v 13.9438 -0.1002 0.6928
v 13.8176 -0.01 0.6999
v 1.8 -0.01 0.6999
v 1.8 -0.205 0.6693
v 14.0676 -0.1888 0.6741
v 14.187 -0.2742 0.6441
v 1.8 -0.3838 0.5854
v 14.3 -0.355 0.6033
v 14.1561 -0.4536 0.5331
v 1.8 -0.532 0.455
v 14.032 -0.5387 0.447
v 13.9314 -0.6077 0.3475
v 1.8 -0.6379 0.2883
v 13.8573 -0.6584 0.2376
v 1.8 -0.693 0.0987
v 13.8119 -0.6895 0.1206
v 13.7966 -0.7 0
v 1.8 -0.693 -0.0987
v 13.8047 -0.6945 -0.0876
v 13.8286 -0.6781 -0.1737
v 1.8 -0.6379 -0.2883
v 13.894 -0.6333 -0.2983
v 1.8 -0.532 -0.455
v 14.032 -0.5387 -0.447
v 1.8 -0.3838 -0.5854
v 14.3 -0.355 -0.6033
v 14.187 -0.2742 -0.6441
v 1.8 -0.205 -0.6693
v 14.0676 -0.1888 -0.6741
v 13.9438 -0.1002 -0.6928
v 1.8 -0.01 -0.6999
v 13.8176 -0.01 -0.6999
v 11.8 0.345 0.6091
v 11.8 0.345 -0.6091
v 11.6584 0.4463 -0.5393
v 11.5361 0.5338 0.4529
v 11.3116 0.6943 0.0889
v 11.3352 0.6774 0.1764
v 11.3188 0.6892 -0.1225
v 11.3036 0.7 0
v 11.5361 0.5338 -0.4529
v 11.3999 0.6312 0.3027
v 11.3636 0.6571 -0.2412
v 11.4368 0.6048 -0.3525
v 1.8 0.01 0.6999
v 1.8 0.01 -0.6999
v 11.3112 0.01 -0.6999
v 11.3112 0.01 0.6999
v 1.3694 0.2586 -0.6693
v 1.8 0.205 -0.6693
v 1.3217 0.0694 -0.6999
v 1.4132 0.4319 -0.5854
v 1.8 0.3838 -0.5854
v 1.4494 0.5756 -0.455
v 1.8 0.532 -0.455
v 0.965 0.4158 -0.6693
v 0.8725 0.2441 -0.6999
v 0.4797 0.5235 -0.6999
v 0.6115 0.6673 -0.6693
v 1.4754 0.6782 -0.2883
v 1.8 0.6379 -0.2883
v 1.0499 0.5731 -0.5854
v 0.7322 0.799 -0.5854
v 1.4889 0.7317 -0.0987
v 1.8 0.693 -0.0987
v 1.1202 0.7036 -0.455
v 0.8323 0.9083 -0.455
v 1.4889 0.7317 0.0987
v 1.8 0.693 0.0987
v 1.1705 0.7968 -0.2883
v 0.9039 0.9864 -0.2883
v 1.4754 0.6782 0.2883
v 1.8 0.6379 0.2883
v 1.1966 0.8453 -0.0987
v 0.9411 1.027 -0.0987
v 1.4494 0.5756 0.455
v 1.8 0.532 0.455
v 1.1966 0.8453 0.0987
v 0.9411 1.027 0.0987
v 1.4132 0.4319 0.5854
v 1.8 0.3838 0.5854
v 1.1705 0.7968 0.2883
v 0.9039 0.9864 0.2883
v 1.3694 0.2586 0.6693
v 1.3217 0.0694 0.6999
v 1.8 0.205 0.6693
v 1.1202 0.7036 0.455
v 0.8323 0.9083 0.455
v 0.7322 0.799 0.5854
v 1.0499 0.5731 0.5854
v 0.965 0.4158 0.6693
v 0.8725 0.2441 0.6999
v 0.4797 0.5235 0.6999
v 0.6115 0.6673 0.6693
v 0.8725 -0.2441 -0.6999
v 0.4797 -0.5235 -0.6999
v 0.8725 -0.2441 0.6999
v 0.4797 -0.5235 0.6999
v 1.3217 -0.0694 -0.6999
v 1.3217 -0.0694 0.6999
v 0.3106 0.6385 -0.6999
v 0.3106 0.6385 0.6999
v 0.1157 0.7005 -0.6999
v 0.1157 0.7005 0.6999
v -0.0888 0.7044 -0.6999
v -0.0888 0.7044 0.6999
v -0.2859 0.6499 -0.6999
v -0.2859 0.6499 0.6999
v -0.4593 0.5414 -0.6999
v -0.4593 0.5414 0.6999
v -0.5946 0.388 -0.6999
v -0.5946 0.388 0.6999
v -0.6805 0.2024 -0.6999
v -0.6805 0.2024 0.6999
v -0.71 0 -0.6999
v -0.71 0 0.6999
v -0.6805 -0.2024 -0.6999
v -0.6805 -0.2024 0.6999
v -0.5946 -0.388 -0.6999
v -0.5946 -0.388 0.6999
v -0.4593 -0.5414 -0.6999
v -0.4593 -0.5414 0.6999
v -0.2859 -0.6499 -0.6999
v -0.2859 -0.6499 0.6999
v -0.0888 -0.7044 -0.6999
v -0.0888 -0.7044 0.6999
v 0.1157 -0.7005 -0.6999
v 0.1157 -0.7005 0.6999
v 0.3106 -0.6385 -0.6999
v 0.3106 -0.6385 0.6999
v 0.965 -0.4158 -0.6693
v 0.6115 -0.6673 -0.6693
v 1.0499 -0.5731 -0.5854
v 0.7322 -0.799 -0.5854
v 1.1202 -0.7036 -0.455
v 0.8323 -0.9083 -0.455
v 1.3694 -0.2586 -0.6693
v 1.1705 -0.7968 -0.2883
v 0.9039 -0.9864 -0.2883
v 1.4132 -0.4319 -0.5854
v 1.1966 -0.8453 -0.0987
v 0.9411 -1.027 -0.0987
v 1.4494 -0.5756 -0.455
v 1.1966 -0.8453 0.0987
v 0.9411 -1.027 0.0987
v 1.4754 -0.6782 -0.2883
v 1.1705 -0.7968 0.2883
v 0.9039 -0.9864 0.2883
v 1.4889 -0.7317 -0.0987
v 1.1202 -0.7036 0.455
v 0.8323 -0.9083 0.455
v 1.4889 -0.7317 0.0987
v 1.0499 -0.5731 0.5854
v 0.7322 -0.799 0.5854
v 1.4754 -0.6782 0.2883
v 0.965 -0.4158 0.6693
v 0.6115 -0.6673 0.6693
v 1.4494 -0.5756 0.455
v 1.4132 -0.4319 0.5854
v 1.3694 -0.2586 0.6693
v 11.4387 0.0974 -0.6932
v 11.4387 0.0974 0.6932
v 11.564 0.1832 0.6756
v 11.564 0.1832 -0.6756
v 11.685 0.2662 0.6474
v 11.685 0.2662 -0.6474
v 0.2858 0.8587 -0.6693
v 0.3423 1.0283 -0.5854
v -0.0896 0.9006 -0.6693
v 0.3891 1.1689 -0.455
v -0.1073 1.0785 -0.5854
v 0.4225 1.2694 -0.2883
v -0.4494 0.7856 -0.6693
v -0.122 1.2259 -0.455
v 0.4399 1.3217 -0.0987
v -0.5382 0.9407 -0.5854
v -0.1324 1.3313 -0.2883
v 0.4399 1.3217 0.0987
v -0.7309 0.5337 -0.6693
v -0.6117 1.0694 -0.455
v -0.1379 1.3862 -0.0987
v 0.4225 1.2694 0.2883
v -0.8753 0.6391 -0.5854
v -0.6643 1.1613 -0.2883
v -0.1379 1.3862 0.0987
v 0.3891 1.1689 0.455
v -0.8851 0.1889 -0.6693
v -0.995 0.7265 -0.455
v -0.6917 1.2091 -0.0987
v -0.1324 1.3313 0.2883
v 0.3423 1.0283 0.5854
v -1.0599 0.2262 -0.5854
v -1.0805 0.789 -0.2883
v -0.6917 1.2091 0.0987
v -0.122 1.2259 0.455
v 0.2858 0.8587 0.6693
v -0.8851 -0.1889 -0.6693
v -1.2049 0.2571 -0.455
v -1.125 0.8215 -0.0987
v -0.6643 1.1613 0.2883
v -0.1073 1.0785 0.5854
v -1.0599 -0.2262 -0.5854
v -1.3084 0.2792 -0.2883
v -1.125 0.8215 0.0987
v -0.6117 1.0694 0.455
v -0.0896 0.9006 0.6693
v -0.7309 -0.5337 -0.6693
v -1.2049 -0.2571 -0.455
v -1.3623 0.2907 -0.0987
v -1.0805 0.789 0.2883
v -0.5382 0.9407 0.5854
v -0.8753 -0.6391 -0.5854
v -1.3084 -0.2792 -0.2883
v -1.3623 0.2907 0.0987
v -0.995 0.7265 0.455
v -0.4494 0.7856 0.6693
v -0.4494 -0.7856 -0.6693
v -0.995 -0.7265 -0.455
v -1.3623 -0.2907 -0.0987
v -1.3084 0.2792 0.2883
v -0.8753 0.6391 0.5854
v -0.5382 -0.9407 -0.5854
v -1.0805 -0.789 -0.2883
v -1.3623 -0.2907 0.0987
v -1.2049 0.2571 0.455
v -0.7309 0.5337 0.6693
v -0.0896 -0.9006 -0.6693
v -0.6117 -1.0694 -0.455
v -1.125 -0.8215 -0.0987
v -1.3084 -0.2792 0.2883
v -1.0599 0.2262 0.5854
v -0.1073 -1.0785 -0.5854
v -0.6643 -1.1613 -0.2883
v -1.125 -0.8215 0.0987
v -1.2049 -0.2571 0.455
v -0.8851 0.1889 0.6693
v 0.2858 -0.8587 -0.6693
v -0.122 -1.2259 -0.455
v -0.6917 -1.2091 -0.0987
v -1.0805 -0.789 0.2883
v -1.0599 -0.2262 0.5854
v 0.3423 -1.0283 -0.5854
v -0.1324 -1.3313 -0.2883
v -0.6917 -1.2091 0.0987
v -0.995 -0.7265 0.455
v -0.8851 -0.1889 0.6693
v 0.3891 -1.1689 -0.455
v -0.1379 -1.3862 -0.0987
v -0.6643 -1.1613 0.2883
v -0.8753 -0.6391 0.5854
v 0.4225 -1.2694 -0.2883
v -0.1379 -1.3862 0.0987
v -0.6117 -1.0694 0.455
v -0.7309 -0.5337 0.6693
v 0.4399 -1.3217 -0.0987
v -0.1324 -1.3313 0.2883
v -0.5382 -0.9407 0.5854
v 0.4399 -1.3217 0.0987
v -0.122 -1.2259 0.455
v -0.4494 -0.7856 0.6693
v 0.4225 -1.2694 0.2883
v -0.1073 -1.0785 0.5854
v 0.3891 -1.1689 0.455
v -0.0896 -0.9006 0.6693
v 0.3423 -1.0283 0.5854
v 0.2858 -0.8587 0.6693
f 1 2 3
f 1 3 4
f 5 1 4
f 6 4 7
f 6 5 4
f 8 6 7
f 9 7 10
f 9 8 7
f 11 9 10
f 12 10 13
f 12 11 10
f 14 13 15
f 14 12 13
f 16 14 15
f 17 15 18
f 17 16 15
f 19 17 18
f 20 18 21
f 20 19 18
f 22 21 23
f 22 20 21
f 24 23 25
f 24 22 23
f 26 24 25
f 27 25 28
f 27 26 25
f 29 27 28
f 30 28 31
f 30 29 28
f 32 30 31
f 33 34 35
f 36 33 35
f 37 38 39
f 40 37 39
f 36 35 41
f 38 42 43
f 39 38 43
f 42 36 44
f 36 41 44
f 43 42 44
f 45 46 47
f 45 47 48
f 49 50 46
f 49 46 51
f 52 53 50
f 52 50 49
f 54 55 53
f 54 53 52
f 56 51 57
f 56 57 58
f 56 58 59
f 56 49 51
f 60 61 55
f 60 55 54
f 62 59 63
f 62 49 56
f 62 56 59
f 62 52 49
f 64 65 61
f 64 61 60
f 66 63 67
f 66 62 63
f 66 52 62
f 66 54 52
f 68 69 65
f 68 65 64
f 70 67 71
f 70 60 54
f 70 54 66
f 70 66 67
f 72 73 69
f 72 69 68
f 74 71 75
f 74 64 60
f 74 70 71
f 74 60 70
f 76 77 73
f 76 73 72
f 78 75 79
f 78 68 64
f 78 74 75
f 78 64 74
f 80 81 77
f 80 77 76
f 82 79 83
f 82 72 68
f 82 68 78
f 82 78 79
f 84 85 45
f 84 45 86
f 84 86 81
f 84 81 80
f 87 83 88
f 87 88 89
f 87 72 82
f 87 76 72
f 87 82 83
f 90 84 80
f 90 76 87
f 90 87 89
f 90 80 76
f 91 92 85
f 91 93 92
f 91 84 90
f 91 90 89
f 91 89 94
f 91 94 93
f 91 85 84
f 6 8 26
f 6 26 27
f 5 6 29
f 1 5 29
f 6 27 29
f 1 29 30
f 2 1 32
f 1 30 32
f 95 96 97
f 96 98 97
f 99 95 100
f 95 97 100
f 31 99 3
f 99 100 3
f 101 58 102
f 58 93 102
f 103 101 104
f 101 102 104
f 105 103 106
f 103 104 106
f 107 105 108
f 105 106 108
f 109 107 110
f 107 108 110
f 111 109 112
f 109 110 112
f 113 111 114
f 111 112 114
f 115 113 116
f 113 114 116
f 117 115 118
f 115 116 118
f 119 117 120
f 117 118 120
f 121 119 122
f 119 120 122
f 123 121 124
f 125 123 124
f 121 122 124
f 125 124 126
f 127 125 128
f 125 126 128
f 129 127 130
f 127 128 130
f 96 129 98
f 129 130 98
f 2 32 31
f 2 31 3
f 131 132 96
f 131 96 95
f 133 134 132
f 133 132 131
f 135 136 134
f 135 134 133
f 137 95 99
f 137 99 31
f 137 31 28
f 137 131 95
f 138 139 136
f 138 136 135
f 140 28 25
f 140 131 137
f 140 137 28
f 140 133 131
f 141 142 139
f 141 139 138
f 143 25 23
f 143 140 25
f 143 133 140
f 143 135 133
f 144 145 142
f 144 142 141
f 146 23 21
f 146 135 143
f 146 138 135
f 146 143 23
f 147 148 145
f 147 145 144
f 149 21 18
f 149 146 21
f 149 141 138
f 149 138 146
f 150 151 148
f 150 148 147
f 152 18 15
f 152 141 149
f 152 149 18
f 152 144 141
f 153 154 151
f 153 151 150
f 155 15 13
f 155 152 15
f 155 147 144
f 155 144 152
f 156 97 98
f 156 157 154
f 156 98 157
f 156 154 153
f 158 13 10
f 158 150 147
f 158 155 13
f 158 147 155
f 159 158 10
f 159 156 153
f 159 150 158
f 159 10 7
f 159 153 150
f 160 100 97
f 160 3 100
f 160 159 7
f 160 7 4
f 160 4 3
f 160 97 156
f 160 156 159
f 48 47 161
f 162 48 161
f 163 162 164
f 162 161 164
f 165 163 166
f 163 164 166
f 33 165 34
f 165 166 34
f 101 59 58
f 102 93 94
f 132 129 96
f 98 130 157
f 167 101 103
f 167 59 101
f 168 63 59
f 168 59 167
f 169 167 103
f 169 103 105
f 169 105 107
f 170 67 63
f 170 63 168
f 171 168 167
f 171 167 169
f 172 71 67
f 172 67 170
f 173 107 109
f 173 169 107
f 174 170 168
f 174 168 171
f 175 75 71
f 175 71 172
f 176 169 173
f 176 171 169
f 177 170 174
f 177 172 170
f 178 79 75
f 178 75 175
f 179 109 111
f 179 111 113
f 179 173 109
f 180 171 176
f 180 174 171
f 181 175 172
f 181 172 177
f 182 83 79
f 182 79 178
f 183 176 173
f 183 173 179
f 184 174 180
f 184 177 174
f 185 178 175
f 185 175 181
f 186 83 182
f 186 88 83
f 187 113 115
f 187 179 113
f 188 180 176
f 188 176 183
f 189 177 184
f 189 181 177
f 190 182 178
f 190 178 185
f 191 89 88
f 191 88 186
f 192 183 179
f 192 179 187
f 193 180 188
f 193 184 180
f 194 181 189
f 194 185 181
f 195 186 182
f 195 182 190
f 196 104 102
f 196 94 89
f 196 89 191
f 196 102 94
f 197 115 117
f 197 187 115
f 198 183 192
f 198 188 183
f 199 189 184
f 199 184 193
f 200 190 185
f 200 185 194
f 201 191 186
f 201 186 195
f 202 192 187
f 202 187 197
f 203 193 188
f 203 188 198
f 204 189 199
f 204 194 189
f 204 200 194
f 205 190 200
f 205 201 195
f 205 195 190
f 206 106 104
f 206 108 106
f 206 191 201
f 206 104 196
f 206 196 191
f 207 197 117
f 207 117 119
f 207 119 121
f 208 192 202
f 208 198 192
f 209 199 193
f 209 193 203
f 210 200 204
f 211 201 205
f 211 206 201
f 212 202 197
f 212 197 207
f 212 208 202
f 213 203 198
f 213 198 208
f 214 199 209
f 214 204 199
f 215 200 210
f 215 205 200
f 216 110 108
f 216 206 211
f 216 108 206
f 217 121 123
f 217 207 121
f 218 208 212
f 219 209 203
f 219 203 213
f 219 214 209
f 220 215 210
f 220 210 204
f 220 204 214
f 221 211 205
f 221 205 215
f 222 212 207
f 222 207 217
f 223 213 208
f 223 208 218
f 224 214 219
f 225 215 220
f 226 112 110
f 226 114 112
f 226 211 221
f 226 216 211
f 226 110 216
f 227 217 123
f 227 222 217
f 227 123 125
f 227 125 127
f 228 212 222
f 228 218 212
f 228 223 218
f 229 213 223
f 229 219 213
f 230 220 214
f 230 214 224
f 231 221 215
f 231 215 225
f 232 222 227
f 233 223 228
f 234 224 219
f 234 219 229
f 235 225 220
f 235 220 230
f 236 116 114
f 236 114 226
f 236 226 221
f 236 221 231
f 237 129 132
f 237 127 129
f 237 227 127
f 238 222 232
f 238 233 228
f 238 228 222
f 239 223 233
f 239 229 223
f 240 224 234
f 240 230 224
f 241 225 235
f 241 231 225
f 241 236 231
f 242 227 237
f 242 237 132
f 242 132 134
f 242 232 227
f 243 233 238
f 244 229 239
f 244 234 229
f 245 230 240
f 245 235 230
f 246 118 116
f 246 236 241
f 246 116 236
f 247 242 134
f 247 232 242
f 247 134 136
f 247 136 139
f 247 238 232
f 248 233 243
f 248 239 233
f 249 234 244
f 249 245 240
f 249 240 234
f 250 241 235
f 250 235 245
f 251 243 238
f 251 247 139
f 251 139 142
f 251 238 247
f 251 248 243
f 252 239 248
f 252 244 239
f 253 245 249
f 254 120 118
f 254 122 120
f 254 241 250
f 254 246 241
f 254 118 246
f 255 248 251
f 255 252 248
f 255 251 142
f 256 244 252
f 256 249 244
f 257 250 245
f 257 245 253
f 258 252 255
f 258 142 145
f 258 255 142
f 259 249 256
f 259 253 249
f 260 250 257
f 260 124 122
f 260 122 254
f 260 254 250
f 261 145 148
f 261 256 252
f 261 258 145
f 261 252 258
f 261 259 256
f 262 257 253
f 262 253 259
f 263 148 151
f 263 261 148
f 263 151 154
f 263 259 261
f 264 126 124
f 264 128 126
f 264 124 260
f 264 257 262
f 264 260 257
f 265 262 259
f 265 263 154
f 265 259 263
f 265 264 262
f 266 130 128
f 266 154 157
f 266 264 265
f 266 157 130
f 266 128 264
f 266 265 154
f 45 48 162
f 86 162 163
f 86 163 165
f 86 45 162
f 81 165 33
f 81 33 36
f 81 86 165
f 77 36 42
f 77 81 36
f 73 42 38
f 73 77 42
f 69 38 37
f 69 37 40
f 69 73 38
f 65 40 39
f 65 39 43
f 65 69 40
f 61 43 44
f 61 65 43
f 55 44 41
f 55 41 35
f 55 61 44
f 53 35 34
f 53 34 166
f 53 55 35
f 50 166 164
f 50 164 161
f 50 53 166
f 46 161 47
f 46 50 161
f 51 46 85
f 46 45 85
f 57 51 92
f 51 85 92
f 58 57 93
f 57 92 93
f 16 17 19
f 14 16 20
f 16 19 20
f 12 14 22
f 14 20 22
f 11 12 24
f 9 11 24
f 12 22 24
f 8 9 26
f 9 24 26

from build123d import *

# Parameters (mm, degrees)
CUT_EXTRUDE_1_DEPTH      = 15.385405814
CUT_EXTRUDE_1_DEPTH_BACK = 15.385405814


with BuildPart() as part:
    # 扫描2: sweep along a path in Sketch 200
    with BuildLine(Plane.XY) as sweep_2_path:
        Line((11.8, 0.7), (1.8, 0.7))
        ThreePointArc((1.8, 0.7), (1.34176437, 0.785965522), (0.945844504, 1.032171582))
        ThreePointArc((0.945844504, 1.032171582), (-1.4, 0), (0.945844504, -1.032171582))
        ThreePointArc((0.945844504, -1.032171582), (1.34176437, -0.785965522), (1.8, -0.7))
        Line((1.8, -0.7), (14.3, -0.7))
    # 草图2 → 扫描2 (sweep)
    with BuildSketch(Plane(origin=(11.8, 0.7, 0), x_dir=(0, 0, 1), z_dir=(-1, 0, 0))):
        with BuildLine():
            Line((-0.699928568, -0.69), (0.699928568, -0.69))
            ThreePointArc((0.699928568, -0.69), (0, 0), (-0.699928568, -0.69))
        make_face()
    sweep(path=sweep_2_path.line)

    # 草图3 → 切除-拉伸1 (cut, two sides: drawn at the far end of the back side and taken through both)
    with BuildSketch(Plane.XY.offset(-CUT_EXTRUDE_1_DEPTH_BACK)):
        Polygon((11.8, 0.345), (11.303649235, 0.7), (14.31, 0.7), (14.31, -0.7), (13.79664716, -0.7), (14.3, -0.355), (13.803649235, 0), (11.29664716, 0), align=None)
    extrude(amount=CUT_EXTRUDE_1_DEPTH + CUT_EXTRUDE_1_DEPTH_BACK, mode=Mode.SUBTRACT)


solid = part.part
